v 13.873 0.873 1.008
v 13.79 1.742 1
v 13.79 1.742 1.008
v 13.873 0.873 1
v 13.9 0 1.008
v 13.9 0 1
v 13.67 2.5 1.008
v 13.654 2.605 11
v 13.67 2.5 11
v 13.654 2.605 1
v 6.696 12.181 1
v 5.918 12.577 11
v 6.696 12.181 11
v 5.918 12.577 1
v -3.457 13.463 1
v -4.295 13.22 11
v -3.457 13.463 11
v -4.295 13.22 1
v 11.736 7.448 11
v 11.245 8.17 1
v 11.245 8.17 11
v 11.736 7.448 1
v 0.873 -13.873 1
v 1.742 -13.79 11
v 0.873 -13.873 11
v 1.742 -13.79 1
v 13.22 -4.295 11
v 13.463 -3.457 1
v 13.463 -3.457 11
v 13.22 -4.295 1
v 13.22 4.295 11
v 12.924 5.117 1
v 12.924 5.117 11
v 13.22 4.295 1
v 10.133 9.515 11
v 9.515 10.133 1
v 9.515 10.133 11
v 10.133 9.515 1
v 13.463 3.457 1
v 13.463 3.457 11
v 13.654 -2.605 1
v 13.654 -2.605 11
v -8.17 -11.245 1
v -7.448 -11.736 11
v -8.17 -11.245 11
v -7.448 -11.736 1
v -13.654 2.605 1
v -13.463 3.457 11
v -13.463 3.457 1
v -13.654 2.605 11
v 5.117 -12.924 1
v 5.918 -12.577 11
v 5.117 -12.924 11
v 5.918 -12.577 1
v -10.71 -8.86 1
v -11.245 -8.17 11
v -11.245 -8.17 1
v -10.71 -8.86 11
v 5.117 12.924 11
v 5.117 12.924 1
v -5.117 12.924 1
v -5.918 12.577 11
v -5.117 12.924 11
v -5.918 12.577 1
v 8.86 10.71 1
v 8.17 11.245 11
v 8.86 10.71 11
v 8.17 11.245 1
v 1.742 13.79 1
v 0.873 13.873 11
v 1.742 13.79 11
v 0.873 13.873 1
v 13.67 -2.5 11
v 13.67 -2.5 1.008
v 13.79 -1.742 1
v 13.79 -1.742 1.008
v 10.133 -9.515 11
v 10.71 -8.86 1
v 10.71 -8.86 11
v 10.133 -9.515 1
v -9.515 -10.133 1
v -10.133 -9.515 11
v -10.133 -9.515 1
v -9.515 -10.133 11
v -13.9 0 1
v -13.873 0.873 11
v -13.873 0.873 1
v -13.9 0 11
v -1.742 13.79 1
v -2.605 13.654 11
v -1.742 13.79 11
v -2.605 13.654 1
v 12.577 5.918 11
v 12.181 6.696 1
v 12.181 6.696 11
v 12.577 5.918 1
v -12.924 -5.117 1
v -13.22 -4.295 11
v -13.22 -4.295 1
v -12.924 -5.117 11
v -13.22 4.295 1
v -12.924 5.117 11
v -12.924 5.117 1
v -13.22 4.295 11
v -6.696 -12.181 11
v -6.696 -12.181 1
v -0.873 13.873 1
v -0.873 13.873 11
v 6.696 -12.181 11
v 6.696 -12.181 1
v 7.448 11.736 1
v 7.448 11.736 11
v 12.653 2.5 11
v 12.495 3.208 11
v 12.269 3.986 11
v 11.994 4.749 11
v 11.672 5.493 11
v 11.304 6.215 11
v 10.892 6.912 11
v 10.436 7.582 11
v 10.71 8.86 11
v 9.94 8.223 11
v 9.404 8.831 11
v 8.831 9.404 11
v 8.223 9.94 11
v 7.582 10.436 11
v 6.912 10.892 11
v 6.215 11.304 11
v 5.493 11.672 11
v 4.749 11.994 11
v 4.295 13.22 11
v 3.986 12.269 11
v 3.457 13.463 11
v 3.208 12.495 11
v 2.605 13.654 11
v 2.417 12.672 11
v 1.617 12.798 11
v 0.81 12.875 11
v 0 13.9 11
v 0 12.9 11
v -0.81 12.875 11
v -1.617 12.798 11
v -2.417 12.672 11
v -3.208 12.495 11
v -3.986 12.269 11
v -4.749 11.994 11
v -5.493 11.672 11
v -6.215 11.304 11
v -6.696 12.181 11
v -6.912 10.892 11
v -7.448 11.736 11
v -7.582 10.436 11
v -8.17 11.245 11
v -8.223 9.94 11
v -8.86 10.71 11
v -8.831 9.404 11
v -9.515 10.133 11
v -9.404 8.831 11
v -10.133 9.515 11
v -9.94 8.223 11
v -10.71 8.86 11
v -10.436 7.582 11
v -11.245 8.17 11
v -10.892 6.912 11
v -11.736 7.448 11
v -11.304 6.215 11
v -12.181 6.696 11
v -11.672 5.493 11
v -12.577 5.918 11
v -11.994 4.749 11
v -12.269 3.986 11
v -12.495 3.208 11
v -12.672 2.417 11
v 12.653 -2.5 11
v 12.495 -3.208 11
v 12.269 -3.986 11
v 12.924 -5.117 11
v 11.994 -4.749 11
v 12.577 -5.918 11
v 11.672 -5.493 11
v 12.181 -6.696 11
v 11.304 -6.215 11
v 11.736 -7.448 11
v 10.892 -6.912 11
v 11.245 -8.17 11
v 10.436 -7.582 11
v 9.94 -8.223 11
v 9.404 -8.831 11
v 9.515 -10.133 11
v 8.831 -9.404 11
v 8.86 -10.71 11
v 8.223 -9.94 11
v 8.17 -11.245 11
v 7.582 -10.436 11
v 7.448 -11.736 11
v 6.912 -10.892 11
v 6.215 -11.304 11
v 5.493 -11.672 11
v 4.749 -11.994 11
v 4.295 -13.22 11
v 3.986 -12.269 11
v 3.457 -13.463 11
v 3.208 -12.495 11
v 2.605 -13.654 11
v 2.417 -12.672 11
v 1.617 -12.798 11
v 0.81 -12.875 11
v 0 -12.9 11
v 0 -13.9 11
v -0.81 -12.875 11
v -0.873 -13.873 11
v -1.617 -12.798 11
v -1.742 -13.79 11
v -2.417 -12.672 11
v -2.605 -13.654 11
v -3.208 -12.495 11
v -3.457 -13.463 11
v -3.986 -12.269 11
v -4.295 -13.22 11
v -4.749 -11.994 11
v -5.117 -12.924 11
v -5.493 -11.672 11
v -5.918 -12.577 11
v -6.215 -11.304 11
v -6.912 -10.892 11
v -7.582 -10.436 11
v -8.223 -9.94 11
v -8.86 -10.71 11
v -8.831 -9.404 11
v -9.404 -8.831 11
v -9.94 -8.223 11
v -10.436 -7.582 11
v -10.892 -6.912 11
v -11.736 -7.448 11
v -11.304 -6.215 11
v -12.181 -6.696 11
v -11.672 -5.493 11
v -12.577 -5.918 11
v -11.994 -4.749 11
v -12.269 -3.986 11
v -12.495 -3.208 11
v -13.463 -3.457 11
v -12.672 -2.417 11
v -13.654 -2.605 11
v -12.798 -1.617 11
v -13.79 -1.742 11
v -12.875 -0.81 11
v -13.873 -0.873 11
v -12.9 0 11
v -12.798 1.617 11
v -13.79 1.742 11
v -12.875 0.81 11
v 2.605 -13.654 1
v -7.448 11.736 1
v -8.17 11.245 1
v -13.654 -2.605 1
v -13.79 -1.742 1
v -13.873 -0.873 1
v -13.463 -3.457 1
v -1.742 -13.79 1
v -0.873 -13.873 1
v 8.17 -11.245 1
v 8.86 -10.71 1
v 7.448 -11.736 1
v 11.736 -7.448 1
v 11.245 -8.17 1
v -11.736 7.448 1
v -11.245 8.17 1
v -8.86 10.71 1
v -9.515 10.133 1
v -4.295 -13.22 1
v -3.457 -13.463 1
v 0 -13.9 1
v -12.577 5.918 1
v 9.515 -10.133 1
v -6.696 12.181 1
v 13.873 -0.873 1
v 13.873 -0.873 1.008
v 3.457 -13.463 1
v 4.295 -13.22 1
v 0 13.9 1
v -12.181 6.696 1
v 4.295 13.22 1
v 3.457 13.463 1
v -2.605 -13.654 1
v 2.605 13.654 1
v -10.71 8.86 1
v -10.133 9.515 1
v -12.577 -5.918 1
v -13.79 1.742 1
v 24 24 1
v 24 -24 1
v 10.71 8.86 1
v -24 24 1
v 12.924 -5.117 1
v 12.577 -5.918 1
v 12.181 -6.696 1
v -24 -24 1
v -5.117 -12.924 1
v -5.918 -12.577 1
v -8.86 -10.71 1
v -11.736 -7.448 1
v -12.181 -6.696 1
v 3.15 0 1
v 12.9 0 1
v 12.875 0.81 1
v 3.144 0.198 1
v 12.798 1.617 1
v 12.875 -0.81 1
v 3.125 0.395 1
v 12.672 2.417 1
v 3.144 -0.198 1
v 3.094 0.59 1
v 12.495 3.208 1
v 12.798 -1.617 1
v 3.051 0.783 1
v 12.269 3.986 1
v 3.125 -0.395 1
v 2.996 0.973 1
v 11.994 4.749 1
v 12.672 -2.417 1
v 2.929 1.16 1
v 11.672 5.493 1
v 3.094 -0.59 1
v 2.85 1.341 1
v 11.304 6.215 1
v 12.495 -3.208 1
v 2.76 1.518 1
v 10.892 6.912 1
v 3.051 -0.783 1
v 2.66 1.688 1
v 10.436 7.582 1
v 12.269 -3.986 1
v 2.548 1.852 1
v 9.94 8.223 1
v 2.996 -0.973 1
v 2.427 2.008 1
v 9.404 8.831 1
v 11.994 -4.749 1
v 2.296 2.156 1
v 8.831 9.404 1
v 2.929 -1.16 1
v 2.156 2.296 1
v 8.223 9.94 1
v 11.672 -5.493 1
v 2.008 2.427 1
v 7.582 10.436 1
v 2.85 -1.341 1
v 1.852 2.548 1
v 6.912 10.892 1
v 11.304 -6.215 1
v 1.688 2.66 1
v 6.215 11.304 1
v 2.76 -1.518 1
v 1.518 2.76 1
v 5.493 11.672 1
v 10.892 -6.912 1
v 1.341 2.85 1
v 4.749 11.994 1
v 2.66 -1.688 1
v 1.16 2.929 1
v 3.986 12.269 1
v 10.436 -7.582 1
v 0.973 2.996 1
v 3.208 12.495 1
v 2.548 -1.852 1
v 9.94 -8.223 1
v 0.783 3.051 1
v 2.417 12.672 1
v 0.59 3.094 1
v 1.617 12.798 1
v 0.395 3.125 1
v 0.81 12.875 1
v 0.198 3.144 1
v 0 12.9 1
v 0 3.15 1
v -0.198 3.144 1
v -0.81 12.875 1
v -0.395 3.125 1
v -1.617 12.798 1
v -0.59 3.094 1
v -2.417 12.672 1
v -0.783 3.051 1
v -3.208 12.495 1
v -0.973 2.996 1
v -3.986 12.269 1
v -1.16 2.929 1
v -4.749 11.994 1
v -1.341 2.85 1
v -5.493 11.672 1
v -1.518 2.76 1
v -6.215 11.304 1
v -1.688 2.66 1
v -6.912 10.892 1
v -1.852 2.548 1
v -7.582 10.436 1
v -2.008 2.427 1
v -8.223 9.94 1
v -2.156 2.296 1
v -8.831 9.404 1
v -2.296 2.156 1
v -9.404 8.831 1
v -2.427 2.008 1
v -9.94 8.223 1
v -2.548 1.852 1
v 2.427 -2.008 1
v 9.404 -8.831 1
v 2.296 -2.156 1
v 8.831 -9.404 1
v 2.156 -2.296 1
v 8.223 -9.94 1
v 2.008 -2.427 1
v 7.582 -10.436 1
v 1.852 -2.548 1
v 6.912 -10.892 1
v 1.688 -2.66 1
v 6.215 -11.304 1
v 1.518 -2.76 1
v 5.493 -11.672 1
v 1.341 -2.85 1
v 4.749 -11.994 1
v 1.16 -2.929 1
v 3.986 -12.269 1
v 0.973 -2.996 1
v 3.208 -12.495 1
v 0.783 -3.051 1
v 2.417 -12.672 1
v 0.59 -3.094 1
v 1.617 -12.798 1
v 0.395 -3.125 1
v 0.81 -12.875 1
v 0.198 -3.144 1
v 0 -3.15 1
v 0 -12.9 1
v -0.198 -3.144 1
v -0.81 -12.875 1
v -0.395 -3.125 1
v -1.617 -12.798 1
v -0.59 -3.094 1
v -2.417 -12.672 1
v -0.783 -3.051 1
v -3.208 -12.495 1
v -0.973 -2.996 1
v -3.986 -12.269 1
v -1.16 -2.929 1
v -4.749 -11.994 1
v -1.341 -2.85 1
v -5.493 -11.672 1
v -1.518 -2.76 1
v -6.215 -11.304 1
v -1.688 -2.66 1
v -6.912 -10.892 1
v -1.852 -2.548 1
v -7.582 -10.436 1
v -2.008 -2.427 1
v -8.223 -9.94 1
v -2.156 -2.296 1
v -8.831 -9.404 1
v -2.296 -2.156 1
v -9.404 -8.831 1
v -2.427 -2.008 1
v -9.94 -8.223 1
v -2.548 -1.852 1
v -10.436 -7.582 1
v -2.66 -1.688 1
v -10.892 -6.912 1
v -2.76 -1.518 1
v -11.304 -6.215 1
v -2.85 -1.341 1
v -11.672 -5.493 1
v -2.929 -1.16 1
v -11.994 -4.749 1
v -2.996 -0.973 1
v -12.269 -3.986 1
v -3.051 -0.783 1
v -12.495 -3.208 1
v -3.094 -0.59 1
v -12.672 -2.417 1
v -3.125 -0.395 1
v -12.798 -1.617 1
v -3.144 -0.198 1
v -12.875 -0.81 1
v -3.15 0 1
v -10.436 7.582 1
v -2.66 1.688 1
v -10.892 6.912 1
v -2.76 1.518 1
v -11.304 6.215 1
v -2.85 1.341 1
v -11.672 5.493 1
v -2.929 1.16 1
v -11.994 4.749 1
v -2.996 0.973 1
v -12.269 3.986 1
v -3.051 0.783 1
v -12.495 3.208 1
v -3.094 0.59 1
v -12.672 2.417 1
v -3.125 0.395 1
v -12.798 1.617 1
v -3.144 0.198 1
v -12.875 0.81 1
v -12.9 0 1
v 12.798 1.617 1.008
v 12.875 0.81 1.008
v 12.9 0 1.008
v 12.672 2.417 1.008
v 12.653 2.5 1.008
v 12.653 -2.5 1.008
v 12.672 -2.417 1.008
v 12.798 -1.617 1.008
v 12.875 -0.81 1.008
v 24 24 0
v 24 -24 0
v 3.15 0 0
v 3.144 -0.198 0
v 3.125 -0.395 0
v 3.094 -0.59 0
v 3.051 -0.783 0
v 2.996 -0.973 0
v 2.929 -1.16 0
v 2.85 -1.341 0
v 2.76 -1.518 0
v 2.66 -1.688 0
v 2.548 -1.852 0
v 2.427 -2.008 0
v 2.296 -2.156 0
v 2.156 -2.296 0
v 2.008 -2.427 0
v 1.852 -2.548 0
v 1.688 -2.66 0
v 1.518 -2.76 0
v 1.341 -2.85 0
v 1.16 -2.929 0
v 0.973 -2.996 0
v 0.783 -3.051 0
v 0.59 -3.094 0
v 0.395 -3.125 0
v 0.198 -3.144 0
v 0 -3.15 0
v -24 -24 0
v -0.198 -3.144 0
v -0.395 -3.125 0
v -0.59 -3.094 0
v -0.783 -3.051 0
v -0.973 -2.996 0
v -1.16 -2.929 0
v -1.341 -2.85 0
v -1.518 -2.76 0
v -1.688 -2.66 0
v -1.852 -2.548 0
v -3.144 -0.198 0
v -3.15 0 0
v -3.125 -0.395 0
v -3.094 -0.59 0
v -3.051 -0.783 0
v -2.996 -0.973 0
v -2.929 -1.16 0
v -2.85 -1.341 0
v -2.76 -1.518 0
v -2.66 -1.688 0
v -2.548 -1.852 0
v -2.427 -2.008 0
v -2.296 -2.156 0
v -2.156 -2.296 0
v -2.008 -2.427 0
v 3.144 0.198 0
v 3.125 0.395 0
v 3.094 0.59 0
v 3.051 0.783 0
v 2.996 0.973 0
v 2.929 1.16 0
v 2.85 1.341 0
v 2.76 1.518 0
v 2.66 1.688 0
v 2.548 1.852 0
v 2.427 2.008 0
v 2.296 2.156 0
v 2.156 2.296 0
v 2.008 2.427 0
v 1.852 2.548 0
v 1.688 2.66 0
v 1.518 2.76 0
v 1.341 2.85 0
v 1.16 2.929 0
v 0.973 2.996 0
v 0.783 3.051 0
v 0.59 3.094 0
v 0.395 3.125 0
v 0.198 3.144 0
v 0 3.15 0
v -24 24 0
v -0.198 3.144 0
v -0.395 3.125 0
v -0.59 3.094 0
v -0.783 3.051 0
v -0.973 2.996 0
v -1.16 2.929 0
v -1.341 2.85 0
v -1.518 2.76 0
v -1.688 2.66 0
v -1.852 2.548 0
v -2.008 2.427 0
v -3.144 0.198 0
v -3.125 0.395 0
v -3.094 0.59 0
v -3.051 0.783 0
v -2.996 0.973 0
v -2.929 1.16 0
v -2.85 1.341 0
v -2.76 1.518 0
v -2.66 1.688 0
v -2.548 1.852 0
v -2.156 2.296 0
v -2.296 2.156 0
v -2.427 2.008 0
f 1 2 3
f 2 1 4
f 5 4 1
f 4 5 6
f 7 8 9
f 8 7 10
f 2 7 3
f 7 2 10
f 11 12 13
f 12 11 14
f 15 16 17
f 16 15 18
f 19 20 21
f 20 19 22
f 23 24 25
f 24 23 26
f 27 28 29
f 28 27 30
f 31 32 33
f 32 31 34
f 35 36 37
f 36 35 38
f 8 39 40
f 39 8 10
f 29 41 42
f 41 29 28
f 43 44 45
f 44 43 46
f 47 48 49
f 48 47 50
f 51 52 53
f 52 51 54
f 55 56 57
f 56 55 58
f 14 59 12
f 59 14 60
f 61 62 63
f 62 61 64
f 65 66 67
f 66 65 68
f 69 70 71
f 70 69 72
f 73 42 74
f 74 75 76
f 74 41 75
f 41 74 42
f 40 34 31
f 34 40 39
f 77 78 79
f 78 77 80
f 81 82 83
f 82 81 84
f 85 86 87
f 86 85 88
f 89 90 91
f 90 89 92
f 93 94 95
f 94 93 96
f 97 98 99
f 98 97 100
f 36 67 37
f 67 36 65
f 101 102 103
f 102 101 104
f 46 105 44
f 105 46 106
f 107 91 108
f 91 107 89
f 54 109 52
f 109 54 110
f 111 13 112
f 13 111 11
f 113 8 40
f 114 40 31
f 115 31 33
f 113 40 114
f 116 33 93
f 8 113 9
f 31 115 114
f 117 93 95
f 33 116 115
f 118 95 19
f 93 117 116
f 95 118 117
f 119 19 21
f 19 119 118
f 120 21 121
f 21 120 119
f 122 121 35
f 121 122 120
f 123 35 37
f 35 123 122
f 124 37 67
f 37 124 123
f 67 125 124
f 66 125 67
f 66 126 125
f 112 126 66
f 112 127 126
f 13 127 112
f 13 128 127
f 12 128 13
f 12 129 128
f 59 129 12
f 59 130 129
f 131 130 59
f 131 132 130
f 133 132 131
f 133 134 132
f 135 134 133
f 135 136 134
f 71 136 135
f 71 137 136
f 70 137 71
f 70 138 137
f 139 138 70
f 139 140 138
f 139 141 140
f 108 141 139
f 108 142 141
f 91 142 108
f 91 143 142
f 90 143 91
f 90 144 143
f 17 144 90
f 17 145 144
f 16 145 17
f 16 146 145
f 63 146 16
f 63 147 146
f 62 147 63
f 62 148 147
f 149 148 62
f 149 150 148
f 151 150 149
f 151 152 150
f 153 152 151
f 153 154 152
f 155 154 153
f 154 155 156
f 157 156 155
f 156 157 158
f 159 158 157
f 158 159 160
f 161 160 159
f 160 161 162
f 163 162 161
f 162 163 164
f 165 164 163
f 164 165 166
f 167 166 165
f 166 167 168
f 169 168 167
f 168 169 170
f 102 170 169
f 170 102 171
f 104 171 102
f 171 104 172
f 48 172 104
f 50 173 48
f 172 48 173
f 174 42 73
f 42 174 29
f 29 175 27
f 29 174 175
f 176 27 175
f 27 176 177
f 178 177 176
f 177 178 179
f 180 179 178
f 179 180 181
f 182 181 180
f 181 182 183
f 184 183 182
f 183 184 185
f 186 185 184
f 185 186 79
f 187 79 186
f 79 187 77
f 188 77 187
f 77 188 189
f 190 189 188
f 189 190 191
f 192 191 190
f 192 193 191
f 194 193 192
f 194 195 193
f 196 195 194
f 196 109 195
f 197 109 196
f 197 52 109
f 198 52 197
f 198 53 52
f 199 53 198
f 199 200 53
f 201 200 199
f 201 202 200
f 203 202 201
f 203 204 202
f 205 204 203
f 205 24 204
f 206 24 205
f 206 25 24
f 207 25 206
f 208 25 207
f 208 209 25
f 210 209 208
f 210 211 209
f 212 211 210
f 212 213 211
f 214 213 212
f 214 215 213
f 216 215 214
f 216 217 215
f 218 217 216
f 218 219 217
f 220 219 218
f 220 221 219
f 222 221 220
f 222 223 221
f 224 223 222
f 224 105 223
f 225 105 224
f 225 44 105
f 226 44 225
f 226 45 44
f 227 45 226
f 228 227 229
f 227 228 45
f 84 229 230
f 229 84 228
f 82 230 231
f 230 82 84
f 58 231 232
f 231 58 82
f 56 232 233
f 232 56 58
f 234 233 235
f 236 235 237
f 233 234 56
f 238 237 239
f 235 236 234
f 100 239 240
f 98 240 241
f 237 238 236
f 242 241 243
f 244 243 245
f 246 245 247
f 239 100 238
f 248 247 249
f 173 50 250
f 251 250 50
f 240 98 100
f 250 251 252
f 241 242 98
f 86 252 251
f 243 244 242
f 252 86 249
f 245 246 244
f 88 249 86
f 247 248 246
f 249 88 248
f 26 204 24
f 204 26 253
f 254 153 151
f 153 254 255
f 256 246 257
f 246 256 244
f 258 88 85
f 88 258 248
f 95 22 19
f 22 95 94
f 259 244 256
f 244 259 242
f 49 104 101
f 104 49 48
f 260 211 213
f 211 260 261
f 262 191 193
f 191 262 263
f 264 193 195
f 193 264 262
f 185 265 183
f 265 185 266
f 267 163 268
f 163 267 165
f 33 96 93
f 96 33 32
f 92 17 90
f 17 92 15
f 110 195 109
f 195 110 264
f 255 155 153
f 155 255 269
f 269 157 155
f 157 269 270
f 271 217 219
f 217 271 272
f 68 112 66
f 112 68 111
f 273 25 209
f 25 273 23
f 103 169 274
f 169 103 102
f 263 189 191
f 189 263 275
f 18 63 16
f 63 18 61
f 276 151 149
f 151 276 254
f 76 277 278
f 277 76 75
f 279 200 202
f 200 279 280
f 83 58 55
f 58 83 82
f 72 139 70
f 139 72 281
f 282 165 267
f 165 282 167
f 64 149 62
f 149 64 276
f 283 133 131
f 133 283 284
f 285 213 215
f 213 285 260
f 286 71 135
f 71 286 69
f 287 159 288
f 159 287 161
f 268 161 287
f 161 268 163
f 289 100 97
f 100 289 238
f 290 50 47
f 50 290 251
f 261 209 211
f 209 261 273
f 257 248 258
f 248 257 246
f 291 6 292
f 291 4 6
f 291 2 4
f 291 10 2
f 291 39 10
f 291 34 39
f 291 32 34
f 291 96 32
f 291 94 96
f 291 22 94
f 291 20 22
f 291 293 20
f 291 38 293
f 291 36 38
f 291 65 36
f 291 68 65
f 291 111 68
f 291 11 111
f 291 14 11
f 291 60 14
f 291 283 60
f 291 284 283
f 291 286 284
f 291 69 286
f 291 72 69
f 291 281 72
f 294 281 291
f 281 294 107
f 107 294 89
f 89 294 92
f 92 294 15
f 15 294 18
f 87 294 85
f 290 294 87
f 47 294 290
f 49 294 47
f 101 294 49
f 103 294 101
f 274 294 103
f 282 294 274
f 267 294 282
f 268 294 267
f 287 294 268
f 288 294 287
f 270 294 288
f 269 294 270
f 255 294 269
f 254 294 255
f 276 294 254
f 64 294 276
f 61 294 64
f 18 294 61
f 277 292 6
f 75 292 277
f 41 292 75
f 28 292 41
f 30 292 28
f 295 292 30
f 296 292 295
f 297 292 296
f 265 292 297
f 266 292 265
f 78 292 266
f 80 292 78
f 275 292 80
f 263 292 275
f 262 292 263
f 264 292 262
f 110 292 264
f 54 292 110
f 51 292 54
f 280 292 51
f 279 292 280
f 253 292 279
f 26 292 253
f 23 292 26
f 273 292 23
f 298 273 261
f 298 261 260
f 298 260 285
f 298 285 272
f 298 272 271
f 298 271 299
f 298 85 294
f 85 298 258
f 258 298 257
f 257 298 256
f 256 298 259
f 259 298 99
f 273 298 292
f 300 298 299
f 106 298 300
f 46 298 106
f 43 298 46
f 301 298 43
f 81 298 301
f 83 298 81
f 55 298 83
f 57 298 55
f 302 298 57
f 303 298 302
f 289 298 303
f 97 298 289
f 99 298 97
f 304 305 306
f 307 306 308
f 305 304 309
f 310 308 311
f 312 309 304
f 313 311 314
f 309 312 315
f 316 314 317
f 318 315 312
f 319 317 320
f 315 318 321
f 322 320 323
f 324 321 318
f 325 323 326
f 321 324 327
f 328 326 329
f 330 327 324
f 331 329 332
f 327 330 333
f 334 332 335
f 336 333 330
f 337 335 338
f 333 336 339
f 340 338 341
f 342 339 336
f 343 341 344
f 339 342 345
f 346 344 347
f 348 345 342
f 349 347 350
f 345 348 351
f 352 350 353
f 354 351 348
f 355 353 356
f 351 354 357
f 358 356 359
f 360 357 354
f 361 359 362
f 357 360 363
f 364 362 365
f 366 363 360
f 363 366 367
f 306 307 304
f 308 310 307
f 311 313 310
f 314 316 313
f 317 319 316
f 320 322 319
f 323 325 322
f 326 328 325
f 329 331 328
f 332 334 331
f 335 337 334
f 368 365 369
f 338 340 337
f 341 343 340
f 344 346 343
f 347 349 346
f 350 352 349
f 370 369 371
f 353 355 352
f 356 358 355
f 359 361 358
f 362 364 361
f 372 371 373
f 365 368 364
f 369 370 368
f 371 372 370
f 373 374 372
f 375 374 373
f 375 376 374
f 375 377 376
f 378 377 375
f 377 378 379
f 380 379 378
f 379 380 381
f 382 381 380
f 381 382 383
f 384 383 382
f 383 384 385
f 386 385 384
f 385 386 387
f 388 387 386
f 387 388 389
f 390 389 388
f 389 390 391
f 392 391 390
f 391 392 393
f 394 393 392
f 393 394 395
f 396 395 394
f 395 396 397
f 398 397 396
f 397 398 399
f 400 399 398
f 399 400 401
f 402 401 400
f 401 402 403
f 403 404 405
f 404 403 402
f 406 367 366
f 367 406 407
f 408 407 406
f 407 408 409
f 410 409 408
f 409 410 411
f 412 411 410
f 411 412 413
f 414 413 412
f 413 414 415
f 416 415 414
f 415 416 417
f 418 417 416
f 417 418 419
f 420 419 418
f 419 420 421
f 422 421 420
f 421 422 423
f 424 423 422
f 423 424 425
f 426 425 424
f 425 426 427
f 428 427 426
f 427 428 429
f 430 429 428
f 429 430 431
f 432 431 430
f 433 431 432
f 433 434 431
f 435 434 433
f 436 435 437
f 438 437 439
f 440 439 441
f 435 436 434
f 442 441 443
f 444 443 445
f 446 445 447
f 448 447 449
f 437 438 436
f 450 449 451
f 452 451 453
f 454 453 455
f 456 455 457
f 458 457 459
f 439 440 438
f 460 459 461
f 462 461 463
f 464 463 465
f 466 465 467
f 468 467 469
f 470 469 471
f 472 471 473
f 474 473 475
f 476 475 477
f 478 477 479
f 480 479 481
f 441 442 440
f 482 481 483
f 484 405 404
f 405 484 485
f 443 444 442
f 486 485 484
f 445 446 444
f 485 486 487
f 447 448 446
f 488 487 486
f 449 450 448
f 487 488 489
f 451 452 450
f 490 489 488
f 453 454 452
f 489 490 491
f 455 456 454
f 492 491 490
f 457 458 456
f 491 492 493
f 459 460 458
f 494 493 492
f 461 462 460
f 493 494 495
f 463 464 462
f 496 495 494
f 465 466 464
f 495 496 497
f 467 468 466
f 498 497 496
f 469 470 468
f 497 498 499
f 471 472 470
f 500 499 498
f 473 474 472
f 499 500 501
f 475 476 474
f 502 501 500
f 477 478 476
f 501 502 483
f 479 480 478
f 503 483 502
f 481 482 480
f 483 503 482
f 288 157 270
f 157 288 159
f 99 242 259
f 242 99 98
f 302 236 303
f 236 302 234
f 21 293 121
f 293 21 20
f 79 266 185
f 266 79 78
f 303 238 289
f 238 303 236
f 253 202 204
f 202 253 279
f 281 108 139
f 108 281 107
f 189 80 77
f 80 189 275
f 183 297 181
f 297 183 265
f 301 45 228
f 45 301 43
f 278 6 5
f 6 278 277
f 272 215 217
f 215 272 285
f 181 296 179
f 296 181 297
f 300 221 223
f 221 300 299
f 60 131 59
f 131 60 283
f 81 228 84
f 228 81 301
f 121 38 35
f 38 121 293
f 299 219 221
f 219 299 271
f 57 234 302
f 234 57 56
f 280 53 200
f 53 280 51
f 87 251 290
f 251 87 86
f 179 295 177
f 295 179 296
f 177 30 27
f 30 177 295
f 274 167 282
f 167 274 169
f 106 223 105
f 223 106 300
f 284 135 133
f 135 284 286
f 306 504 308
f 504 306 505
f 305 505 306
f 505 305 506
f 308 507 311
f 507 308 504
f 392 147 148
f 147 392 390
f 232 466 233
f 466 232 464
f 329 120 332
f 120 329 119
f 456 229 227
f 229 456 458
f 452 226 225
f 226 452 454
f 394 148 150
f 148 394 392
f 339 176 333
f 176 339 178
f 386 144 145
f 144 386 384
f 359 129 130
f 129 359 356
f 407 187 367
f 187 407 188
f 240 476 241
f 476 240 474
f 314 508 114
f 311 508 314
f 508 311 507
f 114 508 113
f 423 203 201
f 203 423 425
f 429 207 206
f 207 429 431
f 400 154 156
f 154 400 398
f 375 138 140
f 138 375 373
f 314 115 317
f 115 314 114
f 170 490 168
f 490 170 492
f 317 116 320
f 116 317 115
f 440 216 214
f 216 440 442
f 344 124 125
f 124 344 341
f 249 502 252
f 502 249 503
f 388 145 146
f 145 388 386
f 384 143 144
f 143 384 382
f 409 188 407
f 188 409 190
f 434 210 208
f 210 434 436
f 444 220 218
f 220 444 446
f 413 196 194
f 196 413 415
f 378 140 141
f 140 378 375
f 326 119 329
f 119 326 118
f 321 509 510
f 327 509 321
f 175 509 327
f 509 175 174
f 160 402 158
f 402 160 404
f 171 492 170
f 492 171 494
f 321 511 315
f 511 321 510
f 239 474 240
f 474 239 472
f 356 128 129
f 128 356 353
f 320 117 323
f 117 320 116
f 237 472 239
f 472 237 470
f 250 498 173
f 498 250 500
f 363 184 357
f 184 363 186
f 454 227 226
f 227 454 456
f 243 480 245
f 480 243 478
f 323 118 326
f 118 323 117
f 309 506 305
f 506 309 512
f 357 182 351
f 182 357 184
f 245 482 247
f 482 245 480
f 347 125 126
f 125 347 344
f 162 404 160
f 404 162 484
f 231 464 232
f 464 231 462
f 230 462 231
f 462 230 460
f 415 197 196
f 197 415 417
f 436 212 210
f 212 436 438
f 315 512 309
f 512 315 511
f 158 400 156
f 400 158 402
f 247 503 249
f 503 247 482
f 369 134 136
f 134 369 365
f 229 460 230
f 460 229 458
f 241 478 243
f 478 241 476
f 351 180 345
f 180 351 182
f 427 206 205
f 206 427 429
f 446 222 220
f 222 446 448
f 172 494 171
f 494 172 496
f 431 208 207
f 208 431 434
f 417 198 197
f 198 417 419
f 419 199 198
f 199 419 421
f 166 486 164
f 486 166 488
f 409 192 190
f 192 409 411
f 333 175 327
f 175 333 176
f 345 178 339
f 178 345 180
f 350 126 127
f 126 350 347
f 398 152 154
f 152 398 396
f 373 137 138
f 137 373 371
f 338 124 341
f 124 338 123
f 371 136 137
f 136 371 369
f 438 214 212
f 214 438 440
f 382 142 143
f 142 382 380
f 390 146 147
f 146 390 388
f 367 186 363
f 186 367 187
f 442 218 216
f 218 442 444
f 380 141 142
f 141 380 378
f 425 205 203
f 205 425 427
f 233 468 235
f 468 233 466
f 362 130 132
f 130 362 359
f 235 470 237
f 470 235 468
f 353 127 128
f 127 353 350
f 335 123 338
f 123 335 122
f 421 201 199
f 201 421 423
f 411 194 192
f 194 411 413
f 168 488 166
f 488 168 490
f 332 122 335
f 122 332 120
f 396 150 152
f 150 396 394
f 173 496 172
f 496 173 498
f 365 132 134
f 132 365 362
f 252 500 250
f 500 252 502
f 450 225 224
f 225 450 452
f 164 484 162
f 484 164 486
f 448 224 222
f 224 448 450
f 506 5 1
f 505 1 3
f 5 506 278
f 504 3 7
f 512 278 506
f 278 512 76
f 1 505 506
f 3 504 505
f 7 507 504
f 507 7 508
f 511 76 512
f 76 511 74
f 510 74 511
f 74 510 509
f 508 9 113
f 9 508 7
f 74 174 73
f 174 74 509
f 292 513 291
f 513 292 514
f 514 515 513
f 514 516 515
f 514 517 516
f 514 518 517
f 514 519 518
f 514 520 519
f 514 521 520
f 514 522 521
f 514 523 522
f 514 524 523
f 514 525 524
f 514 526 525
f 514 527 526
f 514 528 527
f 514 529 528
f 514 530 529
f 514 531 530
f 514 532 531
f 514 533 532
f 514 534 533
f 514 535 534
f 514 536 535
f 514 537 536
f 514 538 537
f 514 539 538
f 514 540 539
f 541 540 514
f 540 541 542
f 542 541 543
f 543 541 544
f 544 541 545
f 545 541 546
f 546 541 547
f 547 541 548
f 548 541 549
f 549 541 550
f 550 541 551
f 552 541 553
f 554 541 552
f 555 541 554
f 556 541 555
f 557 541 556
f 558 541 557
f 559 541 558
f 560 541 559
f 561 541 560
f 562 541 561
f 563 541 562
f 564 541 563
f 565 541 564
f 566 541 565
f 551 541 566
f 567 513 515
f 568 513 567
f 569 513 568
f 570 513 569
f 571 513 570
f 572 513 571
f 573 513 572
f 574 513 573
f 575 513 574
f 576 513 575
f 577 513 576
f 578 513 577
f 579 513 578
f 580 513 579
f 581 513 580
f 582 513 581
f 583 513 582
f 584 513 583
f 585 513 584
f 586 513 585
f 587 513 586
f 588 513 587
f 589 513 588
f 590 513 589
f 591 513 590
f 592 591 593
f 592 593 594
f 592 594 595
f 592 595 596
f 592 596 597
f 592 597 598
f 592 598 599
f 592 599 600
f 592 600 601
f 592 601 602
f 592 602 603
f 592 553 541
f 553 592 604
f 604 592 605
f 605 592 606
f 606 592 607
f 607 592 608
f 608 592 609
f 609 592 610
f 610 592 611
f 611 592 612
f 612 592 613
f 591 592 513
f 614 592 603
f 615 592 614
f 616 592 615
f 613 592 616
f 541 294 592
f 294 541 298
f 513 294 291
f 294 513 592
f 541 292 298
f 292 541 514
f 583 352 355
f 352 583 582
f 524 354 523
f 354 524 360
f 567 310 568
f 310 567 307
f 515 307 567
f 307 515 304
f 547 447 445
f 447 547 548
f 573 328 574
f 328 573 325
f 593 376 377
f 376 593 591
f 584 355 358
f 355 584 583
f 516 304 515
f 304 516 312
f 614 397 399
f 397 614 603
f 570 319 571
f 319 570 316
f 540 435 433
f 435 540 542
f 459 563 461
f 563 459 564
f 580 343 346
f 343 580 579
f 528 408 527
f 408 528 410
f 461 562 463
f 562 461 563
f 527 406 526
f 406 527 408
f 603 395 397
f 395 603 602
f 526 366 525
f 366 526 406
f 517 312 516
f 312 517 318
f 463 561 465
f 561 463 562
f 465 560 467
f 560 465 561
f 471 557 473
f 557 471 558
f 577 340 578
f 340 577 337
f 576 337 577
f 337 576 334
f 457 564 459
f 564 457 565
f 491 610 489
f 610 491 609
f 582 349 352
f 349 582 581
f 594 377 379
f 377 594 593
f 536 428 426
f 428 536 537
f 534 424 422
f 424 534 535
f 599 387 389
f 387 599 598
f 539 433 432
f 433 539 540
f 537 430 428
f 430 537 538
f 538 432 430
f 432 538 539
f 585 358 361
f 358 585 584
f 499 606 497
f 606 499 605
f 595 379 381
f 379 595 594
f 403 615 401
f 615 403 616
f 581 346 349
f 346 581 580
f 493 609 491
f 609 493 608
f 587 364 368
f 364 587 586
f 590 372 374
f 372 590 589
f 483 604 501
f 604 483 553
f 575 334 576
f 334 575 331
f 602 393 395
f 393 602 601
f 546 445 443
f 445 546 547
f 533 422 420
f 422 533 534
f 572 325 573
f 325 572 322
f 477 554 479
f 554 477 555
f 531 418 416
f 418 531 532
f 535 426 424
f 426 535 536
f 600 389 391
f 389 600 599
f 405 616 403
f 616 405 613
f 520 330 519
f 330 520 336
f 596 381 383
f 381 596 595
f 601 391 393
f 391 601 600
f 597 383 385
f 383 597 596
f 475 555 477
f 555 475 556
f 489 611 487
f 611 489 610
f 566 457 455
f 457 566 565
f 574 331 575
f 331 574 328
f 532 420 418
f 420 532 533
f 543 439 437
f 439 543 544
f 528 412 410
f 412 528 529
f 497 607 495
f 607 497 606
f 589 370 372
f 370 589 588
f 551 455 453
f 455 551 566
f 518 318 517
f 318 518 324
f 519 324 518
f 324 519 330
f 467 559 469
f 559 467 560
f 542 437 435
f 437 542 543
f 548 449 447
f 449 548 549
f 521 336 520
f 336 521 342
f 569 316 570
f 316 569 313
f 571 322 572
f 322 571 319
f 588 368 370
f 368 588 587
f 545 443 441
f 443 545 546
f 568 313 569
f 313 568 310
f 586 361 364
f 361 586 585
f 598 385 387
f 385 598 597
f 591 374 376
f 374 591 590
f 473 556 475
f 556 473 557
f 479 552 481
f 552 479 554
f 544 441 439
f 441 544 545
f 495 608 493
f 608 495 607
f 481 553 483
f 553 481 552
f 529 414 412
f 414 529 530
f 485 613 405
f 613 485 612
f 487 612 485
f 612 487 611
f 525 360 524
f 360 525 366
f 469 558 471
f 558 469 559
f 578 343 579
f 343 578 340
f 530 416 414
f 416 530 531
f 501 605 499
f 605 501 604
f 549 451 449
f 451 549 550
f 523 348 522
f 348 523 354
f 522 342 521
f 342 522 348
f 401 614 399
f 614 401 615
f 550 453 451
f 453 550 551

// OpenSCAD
eps=1/128;
$fn=100;

motor_width = 24;
motor_back_hole_width = 6.3;
motor_height = 12.36;
motor_pin_height = 20.13;

holder_height = 10;

skirt_plate_dist = 2; // distance from top skirt to magnet plate
skirt_width = 10;

plate_width = 40;

cage_width = motor_width + skirt_plate_dist + skirt_width;
cage_plate_dist = 1; // distance from top of skirt to top of plate
cage_height = motor_pin_height + cage_plate_dist;


wt = 1;

cage(); 

module cage() {
    difference() {
        union() {
            translate([0,0,wt/2]) cube([motor_width*2,  motor_width*2, wt], center=true);
            translate([0,0,wt]) difference() {
                cylinder(h=holder_height, r=motor_width/2+wt+0.4+0.5);
                translate([0,0,-5]) cylinder(h=holder_height+10, r=motor_width/2+0.4+0.5);
                translate([motor_width/2-wt,0,(holder_height+2)/2+eps]) cube([10, 5, holder_height+2], center=true);
            }
        }
        translate([0,0,-10]) cylinder(h=20, r=motor_back_hole_width/2);
    }
}
